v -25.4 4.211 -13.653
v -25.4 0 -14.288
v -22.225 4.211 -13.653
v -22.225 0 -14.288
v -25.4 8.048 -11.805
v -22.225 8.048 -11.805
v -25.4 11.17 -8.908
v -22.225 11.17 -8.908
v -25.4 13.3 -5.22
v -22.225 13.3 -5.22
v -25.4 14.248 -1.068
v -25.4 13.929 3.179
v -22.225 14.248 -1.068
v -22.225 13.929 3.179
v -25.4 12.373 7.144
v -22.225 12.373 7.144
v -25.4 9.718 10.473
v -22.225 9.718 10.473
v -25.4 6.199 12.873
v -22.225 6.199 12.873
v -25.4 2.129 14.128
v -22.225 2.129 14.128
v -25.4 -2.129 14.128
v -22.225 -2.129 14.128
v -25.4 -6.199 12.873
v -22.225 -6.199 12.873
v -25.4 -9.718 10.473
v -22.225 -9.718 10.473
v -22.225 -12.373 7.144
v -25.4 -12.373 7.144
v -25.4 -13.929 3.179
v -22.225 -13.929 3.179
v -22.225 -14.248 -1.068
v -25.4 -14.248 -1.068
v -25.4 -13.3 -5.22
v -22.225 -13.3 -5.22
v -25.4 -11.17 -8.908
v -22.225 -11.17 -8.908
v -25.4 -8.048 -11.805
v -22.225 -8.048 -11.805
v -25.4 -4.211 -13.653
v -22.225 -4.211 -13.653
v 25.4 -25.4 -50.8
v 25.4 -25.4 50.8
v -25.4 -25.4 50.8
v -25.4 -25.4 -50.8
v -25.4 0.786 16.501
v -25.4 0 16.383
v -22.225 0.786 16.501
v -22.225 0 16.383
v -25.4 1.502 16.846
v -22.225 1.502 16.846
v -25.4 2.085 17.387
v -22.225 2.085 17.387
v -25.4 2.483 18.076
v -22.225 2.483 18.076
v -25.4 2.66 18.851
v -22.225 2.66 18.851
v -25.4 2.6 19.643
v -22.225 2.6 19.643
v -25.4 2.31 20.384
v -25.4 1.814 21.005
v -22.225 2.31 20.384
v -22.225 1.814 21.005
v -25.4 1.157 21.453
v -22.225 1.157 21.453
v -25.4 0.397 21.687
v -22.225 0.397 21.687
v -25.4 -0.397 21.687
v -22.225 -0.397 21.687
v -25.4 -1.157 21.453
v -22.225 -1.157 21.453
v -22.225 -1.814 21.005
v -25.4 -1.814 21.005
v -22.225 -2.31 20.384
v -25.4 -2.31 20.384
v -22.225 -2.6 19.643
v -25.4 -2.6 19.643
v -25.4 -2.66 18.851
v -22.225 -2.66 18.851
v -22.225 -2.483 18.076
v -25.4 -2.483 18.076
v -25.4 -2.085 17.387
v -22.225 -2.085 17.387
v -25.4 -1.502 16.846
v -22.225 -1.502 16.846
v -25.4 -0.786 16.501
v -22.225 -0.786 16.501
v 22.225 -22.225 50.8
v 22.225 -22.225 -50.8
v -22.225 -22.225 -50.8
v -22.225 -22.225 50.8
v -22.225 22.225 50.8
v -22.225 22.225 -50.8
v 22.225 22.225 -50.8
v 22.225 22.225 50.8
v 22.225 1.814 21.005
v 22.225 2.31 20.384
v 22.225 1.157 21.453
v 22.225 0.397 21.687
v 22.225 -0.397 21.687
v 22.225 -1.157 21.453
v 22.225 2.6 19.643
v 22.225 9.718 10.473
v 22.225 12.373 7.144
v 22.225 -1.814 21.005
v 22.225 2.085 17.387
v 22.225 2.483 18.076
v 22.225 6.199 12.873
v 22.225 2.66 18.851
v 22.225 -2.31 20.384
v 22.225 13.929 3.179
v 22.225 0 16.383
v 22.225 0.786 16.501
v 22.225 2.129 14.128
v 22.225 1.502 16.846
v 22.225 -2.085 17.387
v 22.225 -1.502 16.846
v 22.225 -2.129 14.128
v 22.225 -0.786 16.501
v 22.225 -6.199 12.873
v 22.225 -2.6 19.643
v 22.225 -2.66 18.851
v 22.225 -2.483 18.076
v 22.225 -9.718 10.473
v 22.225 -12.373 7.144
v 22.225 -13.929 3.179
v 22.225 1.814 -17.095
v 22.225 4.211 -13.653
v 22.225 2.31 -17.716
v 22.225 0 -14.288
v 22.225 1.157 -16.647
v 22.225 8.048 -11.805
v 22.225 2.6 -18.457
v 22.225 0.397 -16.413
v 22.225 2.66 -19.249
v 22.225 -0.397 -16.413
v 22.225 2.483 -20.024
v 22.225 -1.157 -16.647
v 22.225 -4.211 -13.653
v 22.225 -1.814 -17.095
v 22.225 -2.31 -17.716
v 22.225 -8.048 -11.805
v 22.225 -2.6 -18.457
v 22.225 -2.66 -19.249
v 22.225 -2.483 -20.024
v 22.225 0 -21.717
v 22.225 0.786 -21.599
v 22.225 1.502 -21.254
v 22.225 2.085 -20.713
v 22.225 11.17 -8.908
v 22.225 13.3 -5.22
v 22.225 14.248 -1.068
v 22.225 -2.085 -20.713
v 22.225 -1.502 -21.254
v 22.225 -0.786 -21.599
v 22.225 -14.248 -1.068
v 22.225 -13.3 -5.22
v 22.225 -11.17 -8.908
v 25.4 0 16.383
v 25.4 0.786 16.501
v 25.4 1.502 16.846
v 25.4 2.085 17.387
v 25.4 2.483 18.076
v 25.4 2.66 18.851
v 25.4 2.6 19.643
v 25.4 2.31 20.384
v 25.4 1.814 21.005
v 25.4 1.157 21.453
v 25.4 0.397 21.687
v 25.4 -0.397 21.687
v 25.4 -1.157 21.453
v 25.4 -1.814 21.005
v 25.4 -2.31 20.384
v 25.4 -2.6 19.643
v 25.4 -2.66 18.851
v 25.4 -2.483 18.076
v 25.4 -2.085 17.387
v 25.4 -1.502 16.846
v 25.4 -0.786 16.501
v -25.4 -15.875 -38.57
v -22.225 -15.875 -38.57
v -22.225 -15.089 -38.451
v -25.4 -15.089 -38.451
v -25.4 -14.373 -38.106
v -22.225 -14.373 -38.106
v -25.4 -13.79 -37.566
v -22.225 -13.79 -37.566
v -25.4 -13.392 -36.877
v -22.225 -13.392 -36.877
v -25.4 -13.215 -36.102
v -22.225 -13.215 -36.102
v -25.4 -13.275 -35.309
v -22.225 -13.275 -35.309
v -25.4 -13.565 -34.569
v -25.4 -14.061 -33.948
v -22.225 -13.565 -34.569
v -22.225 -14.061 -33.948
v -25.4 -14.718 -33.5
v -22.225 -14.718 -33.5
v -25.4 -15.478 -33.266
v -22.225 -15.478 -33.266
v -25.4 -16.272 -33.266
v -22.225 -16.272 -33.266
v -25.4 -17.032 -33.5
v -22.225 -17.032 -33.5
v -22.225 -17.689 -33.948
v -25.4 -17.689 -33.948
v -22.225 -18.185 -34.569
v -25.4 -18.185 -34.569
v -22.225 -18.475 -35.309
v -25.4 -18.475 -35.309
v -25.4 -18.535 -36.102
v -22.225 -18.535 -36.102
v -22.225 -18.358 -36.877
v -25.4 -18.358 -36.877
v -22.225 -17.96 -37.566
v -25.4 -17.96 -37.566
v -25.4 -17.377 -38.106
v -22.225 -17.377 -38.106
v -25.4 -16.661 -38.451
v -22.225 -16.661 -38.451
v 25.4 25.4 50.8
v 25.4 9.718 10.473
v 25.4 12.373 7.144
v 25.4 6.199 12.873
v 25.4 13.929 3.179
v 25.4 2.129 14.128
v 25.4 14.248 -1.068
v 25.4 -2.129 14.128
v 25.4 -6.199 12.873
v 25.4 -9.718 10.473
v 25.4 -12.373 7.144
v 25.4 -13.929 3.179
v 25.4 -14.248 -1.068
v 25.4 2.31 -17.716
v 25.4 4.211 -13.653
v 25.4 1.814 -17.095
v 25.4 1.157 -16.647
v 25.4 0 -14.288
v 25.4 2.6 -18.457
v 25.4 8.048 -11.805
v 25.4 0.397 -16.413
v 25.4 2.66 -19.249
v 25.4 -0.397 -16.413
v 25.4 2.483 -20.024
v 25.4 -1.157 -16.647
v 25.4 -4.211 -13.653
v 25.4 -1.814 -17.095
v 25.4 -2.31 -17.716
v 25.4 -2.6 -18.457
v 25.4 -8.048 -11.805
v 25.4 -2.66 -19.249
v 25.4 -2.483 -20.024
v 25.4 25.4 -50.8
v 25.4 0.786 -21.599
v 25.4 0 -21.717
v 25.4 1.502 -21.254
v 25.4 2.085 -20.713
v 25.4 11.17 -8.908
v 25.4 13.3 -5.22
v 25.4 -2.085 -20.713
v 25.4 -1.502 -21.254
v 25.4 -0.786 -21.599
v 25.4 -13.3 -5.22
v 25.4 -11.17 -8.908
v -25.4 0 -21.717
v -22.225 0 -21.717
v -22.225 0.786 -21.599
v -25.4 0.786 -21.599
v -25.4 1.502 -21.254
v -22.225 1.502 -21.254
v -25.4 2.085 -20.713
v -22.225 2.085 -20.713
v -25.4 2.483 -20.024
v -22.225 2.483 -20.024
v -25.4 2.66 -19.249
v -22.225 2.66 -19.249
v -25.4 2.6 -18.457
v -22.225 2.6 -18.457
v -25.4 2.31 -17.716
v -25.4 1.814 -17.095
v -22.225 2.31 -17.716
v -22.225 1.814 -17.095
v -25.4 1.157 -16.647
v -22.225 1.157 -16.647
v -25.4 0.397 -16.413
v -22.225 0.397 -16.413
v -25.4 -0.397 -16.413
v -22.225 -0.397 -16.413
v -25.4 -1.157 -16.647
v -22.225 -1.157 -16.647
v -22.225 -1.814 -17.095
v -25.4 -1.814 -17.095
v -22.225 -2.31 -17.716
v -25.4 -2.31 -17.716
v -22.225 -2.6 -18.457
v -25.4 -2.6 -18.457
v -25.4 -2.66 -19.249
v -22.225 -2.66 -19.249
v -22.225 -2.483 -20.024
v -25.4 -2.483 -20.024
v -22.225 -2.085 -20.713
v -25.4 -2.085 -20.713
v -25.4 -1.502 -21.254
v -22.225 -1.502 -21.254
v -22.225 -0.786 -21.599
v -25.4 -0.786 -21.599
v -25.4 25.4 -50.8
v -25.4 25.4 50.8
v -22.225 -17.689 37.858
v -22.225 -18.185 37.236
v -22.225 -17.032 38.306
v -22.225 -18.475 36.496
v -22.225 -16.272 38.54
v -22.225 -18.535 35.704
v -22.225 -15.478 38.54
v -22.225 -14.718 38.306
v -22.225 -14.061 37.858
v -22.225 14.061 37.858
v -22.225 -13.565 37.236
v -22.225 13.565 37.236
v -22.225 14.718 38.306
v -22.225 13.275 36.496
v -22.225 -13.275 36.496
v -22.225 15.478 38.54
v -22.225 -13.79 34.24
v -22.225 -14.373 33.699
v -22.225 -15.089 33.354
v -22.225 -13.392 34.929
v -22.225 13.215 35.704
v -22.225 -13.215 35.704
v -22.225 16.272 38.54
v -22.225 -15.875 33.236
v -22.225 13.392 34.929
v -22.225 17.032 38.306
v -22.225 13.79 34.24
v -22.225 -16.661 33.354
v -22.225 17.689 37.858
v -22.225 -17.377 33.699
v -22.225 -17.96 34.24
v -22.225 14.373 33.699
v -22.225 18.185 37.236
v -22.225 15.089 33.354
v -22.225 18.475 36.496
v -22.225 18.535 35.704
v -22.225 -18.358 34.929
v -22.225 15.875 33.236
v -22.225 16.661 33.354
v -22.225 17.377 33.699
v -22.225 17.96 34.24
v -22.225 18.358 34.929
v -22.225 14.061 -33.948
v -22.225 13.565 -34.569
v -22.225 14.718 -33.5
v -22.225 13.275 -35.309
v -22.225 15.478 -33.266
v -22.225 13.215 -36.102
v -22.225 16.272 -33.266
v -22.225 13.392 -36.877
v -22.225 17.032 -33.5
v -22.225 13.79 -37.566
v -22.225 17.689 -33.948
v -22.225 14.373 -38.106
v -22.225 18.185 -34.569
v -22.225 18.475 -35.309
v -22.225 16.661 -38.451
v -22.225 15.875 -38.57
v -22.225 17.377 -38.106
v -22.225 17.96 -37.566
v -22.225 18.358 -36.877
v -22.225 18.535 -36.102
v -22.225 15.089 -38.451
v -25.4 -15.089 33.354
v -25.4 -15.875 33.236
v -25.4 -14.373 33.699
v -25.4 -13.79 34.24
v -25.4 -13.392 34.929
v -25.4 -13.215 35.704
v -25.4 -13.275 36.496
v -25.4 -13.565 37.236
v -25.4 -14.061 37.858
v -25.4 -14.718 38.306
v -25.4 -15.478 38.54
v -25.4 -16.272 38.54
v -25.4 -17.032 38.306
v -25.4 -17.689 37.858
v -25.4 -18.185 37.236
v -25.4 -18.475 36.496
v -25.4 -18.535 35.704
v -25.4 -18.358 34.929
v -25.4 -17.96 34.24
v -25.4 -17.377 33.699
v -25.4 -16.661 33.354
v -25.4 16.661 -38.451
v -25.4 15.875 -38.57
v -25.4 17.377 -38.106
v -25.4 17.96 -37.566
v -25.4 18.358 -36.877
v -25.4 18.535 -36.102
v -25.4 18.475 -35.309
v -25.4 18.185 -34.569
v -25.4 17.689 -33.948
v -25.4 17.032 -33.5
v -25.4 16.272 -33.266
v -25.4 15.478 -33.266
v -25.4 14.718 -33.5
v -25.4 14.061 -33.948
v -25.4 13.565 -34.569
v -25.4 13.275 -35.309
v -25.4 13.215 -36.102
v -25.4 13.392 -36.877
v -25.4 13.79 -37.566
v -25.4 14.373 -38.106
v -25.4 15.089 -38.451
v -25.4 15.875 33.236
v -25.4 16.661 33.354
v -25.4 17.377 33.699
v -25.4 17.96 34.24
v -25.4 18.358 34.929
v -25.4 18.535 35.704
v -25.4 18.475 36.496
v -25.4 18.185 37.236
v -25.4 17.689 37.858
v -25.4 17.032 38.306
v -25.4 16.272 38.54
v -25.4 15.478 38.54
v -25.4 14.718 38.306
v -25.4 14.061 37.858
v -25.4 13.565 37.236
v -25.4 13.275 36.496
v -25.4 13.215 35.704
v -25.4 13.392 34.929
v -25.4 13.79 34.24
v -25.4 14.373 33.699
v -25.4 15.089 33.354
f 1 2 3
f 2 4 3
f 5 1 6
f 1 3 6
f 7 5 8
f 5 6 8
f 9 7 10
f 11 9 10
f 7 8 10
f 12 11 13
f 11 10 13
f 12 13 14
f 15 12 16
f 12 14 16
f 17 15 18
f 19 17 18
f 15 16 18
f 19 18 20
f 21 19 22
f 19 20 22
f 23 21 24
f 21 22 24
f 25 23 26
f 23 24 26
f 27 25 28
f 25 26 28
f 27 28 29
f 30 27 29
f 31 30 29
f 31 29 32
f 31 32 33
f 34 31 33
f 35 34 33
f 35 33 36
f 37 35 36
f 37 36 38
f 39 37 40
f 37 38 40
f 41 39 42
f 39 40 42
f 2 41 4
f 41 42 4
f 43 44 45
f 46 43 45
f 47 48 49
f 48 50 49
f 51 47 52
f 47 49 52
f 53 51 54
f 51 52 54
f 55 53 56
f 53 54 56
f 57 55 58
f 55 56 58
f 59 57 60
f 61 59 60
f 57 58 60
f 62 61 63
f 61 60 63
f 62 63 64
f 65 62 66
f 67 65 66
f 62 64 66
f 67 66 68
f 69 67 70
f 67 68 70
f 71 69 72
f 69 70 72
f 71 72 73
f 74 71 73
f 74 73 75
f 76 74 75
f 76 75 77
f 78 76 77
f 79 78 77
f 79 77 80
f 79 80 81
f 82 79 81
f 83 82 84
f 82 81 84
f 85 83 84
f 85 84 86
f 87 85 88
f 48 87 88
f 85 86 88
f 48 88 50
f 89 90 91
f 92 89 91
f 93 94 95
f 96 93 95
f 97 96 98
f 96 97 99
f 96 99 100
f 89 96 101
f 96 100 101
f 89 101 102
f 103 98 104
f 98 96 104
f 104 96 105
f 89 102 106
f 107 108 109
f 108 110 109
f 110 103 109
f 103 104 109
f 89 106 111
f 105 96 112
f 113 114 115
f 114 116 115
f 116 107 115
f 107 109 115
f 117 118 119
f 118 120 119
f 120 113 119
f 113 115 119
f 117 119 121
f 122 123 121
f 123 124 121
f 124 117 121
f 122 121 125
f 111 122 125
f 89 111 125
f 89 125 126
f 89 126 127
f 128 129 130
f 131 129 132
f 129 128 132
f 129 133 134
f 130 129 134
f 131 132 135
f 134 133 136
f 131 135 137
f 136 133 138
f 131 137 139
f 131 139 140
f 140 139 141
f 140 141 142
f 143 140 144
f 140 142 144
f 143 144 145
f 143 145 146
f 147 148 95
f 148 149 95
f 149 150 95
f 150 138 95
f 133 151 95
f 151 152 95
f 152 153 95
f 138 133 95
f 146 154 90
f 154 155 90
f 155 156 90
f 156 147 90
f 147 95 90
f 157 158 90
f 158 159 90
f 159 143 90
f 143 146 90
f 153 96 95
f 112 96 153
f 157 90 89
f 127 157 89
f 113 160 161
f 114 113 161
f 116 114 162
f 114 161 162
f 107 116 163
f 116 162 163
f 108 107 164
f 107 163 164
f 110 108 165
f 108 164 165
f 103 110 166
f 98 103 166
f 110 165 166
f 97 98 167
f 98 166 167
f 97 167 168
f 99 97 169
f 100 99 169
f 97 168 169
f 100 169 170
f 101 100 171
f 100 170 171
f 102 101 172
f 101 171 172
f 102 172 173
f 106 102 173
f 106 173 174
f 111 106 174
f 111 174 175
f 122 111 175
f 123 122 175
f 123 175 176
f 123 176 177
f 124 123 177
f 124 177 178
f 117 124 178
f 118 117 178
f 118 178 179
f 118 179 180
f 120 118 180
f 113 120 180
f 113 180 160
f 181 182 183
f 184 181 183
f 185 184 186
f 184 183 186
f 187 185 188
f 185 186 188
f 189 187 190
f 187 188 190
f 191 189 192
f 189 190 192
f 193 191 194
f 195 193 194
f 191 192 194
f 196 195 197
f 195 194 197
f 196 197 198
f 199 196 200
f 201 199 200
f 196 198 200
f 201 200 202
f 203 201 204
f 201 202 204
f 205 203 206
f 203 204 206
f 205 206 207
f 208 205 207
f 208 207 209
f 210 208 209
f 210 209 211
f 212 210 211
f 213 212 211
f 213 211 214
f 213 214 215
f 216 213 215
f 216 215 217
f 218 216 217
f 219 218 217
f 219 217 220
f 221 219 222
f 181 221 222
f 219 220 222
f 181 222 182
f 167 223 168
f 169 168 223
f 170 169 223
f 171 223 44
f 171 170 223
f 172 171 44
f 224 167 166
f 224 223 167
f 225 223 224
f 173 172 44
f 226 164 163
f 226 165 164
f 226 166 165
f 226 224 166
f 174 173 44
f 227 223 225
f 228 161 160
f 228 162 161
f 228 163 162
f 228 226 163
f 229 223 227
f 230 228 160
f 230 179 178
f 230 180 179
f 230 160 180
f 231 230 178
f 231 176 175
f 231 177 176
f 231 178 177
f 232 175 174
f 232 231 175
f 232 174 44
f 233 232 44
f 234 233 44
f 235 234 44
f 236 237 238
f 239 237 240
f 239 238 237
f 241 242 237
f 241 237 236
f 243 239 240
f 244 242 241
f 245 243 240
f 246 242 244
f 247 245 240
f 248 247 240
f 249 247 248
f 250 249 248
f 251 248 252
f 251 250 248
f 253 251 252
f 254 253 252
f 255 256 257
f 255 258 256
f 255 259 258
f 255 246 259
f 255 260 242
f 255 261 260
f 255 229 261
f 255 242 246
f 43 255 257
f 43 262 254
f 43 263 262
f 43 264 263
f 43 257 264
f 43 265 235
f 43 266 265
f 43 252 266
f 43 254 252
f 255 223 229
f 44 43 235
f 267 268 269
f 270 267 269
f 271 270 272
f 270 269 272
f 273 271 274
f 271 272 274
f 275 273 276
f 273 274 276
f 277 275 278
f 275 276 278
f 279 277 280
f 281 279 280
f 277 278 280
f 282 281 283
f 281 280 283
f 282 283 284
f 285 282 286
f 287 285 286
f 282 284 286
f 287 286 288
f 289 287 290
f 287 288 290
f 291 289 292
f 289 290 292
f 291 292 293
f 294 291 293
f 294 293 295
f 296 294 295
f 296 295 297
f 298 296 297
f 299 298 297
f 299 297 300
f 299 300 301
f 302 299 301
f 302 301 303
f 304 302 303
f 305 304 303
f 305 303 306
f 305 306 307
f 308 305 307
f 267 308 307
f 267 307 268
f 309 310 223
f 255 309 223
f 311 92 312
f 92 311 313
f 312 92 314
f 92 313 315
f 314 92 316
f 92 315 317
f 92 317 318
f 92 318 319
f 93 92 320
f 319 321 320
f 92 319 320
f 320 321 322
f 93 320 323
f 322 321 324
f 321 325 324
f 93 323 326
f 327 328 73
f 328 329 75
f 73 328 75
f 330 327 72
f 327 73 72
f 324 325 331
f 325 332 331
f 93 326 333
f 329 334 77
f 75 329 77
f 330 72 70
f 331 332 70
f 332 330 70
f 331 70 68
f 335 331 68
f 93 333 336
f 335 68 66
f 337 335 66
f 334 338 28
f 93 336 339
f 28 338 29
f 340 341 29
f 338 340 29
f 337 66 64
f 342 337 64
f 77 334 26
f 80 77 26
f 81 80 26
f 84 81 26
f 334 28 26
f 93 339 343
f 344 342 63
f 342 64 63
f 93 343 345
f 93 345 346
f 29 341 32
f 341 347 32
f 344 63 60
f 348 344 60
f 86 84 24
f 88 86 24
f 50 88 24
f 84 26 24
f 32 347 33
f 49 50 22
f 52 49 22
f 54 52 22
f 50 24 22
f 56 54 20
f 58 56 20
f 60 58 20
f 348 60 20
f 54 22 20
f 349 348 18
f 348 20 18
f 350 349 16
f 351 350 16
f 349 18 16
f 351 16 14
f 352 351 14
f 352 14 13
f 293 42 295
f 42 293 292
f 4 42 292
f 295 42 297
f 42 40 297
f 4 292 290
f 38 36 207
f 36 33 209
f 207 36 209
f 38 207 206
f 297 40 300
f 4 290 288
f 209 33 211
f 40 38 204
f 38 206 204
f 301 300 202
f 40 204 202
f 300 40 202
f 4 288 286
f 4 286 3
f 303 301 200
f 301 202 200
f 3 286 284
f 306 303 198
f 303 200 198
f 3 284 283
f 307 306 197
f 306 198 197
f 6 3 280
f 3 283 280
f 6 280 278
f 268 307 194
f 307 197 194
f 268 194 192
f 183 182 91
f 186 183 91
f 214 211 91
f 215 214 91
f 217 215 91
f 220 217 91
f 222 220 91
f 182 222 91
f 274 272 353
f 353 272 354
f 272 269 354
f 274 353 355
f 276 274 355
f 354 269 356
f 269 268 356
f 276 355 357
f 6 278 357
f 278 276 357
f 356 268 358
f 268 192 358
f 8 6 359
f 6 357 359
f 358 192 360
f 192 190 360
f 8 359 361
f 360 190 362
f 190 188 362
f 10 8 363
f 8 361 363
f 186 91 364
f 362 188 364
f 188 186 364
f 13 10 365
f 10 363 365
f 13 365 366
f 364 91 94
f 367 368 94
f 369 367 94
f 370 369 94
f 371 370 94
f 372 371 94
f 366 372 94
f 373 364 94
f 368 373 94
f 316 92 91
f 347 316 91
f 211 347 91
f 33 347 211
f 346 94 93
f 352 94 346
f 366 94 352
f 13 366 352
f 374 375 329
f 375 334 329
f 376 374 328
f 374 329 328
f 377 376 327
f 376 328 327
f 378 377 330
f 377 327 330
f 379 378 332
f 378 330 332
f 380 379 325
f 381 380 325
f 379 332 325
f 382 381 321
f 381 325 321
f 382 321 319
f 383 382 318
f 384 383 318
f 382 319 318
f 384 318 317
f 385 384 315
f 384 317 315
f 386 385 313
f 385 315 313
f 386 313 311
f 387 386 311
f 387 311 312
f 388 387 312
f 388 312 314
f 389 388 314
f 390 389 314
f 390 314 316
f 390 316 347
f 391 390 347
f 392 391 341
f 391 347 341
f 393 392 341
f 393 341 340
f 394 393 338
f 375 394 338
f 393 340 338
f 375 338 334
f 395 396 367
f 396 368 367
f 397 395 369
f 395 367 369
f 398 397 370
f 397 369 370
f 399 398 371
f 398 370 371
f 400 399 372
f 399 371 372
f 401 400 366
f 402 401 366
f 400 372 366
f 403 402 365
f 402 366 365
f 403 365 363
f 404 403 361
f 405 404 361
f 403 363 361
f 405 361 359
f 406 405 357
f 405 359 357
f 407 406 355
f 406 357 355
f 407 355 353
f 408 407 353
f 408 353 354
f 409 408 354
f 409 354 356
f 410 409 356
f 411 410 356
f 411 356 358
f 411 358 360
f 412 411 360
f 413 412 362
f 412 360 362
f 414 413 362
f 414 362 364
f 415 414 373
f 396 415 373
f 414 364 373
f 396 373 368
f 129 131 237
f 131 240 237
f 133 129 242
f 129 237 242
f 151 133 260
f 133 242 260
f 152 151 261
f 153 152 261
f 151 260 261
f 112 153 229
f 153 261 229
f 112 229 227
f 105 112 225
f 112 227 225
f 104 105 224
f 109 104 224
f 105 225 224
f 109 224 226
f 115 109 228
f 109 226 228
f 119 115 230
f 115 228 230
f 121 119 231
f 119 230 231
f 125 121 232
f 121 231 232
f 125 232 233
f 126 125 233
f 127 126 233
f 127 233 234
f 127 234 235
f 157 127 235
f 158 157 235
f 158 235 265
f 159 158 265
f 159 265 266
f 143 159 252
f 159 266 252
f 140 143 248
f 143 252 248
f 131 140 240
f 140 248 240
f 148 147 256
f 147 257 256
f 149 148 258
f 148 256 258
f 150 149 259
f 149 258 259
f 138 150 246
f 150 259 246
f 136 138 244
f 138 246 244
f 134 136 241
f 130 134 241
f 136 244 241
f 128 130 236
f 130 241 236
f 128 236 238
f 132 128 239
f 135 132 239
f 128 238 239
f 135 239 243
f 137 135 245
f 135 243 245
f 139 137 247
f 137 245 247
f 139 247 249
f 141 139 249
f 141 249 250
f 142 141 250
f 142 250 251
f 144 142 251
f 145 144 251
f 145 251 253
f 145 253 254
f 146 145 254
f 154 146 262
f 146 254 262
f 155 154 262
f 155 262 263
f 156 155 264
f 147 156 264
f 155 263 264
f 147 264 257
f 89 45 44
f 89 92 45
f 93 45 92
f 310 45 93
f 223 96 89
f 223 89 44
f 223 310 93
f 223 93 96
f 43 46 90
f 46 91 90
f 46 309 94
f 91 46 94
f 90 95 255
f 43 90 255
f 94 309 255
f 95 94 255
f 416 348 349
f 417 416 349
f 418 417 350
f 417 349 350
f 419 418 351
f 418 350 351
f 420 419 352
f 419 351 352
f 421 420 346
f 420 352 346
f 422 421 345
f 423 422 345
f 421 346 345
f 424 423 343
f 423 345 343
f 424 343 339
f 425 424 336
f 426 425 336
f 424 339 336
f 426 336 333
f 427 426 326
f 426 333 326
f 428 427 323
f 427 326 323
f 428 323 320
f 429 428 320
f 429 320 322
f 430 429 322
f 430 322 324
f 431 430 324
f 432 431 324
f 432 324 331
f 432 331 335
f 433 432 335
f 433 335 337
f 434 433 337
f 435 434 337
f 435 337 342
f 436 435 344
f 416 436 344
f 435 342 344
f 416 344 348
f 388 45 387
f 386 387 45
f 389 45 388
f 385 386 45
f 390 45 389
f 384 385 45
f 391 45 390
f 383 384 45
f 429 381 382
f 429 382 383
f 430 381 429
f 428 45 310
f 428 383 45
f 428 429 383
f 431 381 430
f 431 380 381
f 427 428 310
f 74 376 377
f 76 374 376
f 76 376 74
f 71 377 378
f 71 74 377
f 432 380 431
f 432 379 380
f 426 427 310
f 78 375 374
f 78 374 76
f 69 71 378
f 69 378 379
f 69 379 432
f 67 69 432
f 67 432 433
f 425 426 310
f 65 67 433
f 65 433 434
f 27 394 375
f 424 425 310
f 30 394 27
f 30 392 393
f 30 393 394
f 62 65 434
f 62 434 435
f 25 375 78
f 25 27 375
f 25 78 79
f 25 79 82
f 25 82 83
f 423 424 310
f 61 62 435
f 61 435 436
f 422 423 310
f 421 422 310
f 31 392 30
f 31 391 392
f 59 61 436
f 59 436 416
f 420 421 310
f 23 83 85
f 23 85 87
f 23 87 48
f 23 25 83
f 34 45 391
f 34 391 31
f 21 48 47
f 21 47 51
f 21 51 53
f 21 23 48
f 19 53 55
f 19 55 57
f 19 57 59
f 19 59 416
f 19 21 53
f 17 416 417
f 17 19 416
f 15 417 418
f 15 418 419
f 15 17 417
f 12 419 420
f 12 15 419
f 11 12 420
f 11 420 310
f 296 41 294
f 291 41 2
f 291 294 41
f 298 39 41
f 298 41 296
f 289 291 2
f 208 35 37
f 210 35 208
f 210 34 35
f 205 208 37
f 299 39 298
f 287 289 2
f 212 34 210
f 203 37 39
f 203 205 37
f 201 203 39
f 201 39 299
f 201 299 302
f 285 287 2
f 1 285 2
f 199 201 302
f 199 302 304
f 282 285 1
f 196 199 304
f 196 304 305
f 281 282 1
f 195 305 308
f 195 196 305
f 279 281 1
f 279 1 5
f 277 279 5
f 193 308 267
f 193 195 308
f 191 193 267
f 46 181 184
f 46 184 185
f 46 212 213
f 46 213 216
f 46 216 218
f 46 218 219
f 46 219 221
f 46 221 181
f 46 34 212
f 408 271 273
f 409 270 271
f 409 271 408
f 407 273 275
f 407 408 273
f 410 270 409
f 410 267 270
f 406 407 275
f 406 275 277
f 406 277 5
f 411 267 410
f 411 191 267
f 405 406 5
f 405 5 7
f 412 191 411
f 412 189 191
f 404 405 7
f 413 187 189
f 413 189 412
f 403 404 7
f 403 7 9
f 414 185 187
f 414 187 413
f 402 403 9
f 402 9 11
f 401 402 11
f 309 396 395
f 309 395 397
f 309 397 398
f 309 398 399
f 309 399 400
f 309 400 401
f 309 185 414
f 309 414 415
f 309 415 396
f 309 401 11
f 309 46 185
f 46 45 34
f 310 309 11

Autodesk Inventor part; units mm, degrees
ref_plane "YZ Plane" through (0, 0, 0) normal (1, 0, 0) x (0, 1, 0)
ref_plane "XZ Plane" through (0, 0, 0) normal (0, 1, 0) x (-1, 0, 0)
ref_plane "XY Plane" through (0, 0, 0) normal (0, 0, 1) x (1, 0, 0)
sketch "Sketch1" plane through (0, 0, 0) normal (0, 0, 1) x (1, 0, 0)
  line L0 (-35.56, 0) -> (35.56, 0) construction
  line L1 (0, -35.56) -> (0, 35.56) construction
  line L2 (-25.4, 25.4) -> (25.4, 25.4)
  line L3 (25.4, 25.4) -> (25.4, -25.4)
  line L4 (25.4, -25.4) -> (-25.4, -25.4)
  line L5 (-25.4, -25.4) -> (-25.4, 25.4)
  line L6 (-22.225, 22.225) -> (22.225, 22.225)
  line L7 (22.225, 22.225) -> (22.225, -22.225)
  line L8 (22.225, -22.225) -> (-22.225, -22.225)
  line L9 (-22.225, -22.225) -> (-22.225, 22.225)
  point P0 (0, 0)
  point P1 (-25.4, 0)
  point P2 (0, 25.4)
  point P3 (-22.225, 0)
  point P4 (0, 22.225)
  dimension "d0" = 50.8
  dimension "d1" = 3.175
  dimension "d11" = 50.8
  dimension "d12" = 3.175
extrude "Extrusion1" add sketch "Sketch1" along normal mid plane 101.6
sketch "Sketch6" plane through (25.4, -25.4, 50.8) normal (1, 0, 0) x (0, 0, -1)
  circle A0 centre (50.8, 25.4) radius 14.2875
  dimension "d23" = 28.575
extrude "Extrusion7" cut sketch "Sketch6" against normal through all
sketch "Sketch7" plane through (-22.225, -22.225, -50.8) normal (1, 0, 0) x (0, 0, -1)
  circle A0 centre (-14.8971, 6.35) radius 2.667 projected
  circle A1 centre (-86.7029, 6.35) radius 2.667 projected
  circle A2 centre (-14.8971, 38.1) radius 2.667 projected
  circle A3 centre (-86.7029, 38.1) radius 2.667 projected
  point P0 (-50.8, 22.225)
extrude "Extrusion8" cut sketch "Sketch7" against normal up to next
sketch "Sketch8" plane through (25.4, -25.4, 50.8) normal (1, 0, 0) x (0, 0, -1)
  circle A0 centre (50.8, 25.4) radius 15.875 construction
  line L0 (121.92, 25.4) -> (-20.32, 25.4) construction
  circle A1 centre (69.85, 25.4) radius 3.175 construction
  line L1 (50.8, 9.525) -> (50.8, 41.275) construction
  circle A2 centre (69.85, 25.4) radius 5.5499 construction
  circle A3 centre (69.85, 25.4) radius 2.667
  circle A4 centre (31.75, 25.4) radius 2.667
  point P0 (50.8, 25.4)
  dimension "d28" = 6.35
  dimension "d29" = 11.0998
  dimension "d30" = 5.334
extrude "Extrusion9" cut sketch "Sketch8" against normal through all
equation "\"d12\" = d1"
properties part number "Arm 4 inch" material "Aluminum 6061"
